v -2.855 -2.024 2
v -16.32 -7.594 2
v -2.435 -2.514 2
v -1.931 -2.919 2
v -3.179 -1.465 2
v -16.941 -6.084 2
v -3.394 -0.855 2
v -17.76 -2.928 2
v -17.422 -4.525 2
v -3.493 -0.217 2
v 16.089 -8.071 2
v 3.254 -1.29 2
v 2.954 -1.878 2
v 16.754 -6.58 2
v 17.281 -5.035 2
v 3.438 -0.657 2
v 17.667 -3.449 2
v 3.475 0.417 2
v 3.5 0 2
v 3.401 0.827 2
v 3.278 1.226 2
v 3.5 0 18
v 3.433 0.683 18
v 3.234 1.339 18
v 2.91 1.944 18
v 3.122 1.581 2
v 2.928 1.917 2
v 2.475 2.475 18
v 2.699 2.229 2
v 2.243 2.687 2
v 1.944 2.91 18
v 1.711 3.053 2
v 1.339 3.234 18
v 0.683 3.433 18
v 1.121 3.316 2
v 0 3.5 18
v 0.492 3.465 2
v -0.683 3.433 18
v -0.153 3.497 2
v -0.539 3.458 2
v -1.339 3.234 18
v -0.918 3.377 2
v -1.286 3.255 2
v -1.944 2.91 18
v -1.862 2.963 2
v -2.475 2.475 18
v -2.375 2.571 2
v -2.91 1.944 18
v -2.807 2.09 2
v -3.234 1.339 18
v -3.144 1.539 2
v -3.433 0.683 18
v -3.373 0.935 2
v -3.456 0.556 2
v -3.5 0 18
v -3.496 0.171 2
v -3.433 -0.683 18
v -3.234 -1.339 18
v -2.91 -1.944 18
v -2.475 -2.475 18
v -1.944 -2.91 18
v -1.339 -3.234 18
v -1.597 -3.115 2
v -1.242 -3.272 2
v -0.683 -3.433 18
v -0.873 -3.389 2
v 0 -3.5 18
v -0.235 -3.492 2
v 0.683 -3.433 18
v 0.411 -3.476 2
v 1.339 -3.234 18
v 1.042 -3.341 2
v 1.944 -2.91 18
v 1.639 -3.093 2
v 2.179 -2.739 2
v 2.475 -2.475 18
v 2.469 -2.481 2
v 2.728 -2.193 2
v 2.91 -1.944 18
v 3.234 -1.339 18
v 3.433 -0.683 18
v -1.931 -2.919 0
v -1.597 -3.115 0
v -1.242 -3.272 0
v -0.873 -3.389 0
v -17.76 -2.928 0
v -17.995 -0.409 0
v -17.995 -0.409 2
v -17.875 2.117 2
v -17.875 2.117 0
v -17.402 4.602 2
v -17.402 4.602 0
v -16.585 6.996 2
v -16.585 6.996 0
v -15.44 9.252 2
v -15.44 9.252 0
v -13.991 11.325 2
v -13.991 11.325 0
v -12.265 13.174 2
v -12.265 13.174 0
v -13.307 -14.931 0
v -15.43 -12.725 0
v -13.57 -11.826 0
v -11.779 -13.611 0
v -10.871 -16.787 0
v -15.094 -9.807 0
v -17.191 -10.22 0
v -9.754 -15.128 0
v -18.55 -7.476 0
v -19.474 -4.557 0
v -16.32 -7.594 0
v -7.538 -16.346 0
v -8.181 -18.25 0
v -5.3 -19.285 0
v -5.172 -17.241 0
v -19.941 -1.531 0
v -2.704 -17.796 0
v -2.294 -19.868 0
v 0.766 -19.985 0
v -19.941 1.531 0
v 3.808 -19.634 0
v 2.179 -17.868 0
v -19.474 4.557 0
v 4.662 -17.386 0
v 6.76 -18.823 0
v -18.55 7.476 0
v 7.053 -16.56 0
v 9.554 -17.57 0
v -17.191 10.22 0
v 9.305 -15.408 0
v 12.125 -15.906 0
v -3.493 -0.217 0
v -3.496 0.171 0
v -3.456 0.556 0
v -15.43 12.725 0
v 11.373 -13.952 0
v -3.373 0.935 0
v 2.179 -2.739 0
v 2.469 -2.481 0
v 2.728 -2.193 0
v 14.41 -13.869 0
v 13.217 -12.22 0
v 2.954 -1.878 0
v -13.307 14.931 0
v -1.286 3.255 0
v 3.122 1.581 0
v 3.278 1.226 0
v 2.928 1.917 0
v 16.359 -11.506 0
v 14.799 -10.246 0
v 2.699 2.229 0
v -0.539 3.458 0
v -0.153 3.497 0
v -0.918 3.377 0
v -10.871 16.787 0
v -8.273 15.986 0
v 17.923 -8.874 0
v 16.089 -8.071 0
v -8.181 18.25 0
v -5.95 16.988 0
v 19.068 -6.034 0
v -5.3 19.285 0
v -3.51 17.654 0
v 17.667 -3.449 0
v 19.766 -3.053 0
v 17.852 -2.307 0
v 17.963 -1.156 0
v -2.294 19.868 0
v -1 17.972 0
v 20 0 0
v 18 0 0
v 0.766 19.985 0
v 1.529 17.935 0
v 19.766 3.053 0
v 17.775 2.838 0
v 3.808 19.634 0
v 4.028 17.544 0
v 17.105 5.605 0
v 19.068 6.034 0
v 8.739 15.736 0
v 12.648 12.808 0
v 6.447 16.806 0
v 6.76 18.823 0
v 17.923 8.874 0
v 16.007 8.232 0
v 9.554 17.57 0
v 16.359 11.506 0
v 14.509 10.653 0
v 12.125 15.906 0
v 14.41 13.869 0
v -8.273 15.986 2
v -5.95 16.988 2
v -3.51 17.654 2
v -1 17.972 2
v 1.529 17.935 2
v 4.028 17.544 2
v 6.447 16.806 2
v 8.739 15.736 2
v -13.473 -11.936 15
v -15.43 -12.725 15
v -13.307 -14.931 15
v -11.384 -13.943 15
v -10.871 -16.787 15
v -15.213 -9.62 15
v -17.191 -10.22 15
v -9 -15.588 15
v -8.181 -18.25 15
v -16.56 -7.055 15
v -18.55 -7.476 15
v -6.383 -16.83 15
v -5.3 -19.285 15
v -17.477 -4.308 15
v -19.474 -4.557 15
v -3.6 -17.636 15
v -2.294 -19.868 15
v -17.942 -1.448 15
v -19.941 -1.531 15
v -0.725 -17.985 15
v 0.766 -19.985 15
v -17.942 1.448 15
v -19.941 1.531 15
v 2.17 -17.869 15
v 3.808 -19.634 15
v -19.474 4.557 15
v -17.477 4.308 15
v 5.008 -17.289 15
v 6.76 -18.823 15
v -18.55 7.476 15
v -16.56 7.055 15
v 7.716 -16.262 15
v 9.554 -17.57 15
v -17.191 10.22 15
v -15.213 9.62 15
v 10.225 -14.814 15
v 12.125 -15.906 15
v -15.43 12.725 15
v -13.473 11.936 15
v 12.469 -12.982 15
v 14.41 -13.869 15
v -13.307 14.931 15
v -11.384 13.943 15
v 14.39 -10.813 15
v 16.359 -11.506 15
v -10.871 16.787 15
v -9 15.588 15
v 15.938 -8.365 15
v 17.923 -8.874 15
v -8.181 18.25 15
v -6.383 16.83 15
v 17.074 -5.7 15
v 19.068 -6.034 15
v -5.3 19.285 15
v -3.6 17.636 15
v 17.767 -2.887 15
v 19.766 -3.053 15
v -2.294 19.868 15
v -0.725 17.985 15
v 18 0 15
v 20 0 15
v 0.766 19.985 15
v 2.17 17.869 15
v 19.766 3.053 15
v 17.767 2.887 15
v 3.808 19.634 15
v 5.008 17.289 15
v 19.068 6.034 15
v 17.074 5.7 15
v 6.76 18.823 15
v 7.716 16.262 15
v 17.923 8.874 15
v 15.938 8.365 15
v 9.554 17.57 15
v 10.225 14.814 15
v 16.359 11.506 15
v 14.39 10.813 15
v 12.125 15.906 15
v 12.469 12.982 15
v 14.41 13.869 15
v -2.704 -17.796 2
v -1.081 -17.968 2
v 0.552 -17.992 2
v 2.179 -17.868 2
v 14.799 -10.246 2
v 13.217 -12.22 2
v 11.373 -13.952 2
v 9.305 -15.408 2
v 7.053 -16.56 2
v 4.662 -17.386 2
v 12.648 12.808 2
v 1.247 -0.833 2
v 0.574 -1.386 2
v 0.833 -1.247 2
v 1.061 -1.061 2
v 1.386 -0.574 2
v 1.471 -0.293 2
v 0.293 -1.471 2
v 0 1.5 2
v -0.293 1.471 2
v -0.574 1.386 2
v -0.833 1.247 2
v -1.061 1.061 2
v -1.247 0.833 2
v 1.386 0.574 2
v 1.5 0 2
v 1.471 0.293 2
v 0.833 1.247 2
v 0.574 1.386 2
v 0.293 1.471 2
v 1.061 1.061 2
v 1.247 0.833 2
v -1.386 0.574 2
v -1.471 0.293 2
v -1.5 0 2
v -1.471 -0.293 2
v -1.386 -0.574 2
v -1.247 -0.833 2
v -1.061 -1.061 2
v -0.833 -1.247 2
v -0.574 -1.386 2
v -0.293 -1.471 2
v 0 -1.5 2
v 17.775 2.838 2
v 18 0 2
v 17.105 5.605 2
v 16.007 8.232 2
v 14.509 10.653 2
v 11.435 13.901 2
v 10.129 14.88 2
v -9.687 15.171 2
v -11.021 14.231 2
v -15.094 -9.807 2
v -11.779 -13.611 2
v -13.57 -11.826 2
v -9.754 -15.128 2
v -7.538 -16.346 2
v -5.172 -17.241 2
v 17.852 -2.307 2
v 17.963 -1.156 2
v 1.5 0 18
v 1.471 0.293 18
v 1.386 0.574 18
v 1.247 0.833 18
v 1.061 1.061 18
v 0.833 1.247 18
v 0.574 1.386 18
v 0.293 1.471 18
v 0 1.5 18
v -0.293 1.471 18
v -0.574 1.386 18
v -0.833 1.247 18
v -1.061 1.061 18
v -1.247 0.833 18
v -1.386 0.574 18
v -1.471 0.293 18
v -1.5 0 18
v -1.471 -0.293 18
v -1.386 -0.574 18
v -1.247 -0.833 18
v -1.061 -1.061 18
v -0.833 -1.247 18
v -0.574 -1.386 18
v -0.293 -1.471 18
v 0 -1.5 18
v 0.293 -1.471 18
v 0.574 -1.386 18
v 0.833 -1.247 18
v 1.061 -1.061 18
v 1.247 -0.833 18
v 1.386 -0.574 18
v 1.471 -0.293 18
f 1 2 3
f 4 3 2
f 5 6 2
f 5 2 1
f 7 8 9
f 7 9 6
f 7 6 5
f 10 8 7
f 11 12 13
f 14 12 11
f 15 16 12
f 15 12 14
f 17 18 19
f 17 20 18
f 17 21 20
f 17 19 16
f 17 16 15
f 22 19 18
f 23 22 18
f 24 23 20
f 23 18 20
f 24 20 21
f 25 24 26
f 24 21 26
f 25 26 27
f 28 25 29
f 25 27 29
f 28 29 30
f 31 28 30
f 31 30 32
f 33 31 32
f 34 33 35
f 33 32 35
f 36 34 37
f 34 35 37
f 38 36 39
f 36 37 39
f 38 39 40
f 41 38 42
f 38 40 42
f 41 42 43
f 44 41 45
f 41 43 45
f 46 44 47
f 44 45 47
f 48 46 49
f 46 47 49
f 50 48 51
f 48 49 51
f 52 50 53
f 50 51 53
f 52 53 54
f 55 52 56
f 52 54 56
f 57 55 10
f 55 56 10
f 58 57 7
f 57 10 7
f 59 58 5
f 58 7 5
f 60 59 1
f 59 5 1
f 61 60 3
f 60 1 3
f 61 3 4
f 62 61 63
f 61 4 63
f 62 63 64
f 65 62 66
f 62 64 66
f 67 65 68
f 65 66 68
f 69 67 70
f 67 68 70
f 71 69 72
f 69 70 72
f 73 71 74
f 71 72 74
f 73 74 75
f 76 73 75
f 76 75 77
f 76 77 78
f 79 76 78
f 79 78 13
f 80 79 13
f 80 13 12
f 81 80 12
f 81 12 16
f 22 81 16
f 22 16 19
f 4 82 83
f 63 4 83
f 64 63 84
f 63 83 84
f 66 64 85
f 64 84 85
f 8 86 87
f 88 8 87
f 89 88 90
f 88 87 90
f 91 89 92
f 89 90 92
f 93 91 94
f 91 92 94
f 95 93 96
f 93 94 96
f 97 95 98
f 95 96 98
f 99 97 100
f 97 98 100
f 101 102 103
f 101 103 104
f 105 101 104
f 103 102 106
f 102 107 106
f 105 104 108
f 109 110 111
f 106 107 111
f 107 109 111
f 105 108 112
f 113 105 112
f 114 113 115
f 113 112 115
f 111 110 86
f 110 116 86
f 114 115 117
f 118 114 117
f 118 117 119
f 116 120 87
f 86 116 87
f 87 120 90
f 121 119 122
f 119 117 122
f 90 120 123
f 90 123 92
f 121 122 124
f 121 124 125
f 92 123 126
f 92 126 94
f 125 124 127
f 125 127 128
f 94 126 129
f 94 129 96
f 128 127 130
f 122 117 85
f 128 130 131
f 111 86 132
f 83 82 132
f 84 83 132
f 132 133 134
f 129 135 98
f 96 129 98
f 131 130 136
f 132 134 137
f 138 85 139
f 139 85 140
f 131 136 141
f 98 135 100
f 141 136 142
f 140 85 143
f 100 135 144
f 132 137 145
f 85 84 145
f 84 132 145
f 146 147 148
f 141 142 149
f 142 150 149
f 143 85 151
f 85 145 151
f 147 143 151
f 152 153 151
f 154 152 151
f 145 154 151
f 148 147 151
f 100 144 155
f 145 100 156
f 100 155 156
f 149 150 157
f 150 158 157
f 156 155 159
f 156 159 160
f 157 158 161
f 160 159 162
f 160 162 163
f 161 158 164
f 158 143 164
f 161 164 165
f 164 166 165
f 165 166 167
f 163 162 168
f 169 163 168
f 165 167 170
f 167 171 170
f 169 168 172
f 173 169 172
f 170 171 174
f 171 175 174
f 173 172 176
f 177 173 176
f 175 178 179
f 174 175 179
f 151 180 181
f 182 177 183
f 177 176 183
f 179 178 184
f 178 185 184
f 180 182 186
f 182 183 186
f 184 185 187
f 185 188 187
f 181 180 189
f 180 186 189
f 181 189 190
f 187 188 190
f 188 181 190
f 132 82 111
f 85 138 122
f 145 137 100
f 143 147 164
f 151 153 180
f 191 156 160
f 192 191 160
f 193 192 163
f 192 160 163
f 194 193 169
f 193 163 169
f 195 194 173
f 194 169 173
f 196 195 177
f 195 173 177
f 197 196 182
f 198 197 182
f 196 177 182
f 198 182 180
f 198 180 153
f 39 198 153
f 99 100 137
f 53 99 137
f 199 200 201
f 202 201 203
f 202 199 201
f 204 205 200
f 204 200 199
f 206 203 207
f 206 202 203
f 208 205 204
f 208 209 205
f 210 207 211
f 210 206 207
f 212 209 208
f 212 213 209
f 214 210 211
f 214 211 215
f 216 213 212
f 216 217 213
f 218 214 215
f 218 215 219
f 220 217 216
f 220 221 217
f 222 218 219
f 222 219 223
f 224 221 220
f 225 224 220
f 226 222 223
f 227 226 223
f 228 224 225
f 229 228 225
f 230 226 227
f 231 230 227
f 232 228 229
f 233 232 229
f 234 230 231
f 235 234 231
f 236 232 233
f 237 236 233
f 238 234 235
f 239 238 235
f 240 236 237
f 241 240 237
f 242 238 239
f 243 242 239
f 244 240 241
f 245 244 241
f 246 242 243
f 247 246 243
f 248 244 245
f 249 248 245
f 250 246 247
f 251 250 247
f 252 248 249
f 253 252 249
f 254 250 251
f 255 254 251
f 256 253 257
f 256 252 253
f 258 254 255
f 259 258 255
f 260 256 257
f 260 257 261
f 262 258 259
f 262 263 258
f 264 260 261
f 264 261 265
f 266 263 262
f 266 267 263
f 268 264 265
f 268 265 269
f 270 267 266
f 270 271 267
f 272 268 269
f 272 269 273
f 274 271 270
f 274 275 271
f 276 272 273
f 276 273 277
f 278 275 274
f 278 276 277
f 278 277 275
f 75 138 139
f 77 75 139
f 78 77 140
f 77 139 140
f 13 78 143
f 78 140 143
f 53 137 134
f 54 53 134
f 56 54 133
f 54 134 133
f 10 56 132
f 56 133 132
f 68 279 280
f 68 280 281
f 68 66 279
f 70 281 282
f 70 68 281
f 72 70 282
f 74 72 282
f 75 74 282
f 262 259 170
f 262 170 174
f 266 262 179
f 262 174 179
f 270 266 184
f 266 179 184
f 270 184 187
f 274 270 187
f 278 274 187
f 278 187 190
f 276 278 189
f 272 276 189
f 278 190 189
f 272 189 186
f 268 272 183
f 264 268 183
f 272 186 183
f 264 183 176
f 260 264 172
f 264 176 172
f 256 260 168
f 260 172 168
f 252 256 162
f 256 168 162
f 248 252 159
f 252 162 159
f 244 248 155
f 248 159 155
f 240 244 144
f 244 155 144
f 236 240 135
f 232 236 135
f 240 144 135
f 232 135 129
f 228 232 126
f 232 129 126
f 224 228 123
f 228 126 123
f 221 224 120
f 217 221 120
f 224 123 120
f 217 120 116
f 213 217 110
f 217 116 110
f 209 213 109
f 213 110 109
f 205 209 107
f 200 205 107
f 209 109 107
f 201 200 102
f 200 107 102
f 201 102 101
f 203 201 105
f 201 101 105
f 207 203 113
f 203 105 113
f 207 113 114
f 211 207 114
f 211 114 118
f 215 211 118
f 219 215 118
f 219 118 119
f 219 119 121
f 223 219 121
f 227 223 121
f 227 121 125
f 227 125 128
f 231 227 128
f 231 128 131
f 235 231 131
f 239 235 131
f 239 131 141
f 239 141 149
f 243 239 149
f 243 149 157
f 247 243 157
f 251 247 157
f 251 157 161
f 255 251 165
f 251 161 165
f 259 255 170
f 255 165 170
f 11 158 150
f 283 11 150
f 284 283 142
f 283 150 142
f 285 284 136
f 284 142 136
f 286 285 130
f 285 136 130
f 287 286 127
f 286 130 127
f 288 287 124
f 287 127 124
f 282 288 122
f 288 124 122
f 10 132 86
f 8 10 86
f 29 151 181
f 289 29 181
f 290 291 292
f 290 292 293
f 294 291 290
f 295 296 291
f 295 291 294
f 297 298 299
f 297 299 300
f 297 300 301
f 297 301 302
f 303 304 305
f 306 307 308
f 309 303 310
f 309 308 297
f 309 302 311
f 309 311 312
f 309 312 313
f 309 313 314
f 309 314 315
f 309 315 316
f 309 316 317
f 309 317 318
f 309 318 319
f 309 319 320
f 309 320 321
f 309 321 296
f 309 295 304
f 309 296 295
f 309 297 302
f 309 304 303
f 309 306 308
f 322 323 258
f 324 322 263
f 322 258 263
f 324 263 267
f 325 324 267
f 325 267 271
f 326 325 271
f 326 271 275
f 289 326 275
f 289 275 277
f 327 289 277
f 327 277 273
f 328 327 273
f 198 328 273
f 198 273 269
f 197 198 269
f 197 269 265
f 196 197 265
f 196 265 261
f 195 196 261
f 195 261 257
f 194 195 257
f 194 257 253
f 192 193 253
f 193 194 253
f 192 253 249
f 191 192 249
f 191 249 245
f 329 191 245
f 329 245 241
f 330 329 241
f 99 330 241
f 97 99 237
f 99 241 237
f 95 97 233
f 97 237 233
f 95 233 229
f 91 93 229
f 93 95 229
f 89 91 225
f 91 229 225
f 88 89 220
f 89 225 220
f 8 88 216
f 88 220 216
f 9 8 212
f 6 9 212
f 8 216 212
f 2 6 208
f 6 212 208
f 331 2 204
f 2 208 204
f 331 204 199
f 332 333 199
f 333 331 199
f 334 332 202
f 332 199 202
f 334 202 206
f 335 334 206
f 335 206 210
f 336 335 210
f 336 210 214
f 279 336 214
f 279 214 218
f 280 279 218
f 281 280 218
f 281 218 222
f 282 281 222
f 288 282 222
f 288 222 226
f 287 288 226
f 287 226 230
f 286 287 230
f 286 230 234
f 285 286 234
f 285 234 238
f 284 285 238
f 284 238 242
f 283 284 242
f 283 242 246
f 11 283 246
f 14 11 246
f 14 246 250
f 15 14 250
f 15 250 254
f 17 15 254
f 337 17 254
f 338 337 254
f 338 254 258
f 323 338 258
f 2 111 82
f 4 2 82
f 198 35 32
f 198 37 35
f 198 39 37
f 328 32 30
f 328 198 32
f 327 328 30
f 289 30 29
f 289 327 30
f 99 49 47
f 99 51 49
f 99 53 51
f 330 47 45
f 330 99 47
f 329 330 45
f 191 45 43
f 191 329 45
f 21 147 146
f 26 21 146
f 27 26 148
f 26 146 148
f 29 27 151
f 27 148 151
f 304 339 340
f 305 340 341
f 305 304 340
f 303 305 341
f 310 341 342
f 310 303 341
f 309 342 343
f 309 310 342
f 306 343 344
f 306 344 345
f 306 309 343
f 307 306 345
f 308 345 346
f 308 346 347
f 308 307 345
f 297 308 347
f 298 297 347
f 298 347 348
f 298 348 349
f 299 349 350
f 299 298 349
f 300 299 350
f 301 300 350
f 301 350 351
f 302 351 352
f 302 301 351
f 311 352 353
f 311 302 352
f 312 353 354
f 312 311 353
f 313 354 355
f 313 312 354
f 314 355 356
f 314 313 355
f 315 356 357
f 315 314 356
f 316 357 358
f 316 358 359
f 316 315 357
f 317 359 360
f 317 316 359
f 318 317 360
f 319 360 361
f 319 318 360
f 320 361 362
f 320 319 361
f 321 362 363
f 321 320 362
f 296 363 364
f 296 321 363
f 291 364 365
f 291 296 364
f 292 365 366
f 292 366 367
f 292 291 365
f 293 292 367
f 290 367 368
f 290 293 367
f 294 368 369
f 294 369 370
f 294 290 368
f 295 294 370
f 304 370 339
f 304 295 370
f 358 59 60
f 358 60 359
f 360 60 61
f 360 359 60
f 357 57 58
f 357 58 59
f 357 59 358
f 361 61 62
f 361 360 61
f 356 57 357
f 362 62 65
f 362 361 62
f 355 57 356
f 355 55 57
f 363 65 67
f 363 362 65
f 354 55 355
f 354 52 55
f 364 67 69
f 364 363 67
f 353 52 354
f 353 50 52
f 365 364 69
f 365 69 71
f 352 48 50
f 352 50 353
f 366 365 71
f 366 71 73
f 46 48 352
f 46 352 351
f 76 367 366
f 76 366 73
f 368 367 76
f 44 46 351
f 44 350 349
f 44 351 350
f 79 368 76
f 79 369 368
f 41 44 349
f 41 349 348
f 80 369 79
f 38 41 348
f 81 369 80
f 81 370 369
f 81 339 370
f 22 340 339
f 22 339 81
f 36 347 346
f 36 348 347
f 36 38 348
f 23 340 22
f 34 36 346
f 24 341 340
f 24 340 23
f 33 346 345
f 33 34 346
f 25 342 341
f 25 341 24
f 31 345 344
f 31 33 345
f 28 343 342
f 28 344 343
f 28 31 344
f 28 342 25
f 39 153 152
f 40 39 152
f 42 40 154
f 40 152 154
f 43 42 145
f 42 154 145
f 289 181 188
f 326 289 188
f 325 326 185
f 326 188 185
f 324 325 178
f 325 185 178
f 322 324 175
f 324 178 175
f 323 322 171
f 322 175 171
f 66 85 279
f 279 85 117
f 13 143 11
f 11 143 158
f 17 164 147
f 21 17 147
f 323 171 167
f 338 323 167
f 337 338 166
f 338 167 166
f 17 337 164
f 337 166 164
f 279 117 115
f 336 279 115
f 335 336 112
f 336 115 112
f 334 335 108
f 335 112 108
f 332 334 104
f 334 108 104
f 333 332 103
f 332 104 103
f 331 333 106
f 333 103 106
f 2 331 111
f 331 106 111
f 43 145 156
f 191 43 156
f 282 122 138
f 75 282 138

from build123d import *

# Parameters (mm, degrees)
F0_R     = 20
F1_DEPTH = 15
F2_R     = 18
F3_DEPTH = 13
F4_R     = 3.5
F4_R_2   = 1.5
F5_DEPTH = 16
F7_DEPTH = 2


with BuildPart() as f1:
    # F0 (on Top) → F1 (new body)
    with BuildSketch(Plane.XY):
        Circle(F0_R)
    extrude(amount=F1_DEPTH)

    # F2 (on face) → F3 (cut)
    with BuildSketch(Plane.XY.offset(15)):
        Circle(F2_R)
    extrude(amount=-F3_DEPTH, mode=Mode.SUBTRACT)

    # F4 (on face) → F5 (join)
    with BuildSketch(Plane.XY.offset(2)):
        Circle(F4_R)
        Circle(F4_R_2, mode=Mode.SUBTRACT)
    extrude(amount=F5_DEPTH)

    # F6 (on face) → F7 (cut)
    with BuildSketch(Plane(origin=(0, 0, 0), x_dir=(1, 0, 0), z_dir=(0, 0, -1))):
        with BuildLine():
            ThreePointArc((-1.9313093683, 2.9189114622), (-1.42176068, 3.1982177175), (-0.8730234102, 3.3893701664))
            Line((-0.8730234102, 3.3893701664), (-2.7039568663, 17.7957471679))
            ThreePointArc((-2.7039568663, 17.7957471679), (-10.7932215062, 14.4050813784), (-16.3196684485, 7.5939727238))
            Line((-16.3196684485, 7.5939727238), (-1.9313093683, 2.9189114622))
        make_face()
        with BuildLine():
            ThreePointArc((-3.3728571828, -0.9347911128), (-3.4810340129, -0.3638711329), (-3.4932616532, 0.2170783785))
            Line((-3.4932616532, 0.2170783785), (-17.7603299302, 2.927572505))
            ThreePointArc((-17.7603299302, 2.927572505), (-17.0353353821, -5.813548694), (-12.2653521367, -13.1742603953))
            Line((-12.2653521367, -13.1742603953), (-3.3728571828, -0.9347911128))
        make_face()
        with BuildLine():
            ThreePointArc((-0.1532310099, -3.4966441423), (-0.7296366559, -3.4231024452), (-1.285931023, -3.2552083503))
            Line((-1.285931023, -3.2552083503), (-8.2725306819, -15.9864078553))
            ThreePointArc((-8.2725306819, -15.9864078553), (0.2648052303, -17.9980520665), (8.7392639441, -15.7361134247))
            Line((8.7392639441, -15.7361134247), (-0.1532310099, -3.4966441423))
        make_face()
        with BuildLine():
            ThreePointArc((18, 0), (17.9164345956, 1.7324466465), (17.6665142908, 3.448807448))
            Line((17.6665142908, 3.448807448), (3.2781552106, -1.2262538137))
            ThreePointArc((3.2781552106, -1.2262538137), (3.0300937601, -1.7517225252), (2.6985125738, -2.2289077794))
            Line((2.6985125738, -2.2289077794), (12.6476247957, -12.8077159176))
            ThreePointArc((12.6476247957, -12.8077159176), (16.6080890882, -6.9405602683), (18, 0))
        make_face()
        with BuildLine():
            Line((2.1792423504, 17.8675936482), (2.1792423504, 2.7387776066))
            ThreePointArc((2.1792423504, 2.7387776066), (2.6023375887, 2.3404783858), (2.9537035127, 1.8776675848))
            Line((2.9537035127, 1.8776675848), (16.0891926827, 8.0708041))
            ThreePointArc((16.0891926827, 8.0708041), (10.3647576432, 14.7163785966), (2.1792423504, 17.8675936482))
        make_face()
    extrude(amount=-F7_DEPTH, mode=Mode.SUBTRACT)


solid = f1.part
